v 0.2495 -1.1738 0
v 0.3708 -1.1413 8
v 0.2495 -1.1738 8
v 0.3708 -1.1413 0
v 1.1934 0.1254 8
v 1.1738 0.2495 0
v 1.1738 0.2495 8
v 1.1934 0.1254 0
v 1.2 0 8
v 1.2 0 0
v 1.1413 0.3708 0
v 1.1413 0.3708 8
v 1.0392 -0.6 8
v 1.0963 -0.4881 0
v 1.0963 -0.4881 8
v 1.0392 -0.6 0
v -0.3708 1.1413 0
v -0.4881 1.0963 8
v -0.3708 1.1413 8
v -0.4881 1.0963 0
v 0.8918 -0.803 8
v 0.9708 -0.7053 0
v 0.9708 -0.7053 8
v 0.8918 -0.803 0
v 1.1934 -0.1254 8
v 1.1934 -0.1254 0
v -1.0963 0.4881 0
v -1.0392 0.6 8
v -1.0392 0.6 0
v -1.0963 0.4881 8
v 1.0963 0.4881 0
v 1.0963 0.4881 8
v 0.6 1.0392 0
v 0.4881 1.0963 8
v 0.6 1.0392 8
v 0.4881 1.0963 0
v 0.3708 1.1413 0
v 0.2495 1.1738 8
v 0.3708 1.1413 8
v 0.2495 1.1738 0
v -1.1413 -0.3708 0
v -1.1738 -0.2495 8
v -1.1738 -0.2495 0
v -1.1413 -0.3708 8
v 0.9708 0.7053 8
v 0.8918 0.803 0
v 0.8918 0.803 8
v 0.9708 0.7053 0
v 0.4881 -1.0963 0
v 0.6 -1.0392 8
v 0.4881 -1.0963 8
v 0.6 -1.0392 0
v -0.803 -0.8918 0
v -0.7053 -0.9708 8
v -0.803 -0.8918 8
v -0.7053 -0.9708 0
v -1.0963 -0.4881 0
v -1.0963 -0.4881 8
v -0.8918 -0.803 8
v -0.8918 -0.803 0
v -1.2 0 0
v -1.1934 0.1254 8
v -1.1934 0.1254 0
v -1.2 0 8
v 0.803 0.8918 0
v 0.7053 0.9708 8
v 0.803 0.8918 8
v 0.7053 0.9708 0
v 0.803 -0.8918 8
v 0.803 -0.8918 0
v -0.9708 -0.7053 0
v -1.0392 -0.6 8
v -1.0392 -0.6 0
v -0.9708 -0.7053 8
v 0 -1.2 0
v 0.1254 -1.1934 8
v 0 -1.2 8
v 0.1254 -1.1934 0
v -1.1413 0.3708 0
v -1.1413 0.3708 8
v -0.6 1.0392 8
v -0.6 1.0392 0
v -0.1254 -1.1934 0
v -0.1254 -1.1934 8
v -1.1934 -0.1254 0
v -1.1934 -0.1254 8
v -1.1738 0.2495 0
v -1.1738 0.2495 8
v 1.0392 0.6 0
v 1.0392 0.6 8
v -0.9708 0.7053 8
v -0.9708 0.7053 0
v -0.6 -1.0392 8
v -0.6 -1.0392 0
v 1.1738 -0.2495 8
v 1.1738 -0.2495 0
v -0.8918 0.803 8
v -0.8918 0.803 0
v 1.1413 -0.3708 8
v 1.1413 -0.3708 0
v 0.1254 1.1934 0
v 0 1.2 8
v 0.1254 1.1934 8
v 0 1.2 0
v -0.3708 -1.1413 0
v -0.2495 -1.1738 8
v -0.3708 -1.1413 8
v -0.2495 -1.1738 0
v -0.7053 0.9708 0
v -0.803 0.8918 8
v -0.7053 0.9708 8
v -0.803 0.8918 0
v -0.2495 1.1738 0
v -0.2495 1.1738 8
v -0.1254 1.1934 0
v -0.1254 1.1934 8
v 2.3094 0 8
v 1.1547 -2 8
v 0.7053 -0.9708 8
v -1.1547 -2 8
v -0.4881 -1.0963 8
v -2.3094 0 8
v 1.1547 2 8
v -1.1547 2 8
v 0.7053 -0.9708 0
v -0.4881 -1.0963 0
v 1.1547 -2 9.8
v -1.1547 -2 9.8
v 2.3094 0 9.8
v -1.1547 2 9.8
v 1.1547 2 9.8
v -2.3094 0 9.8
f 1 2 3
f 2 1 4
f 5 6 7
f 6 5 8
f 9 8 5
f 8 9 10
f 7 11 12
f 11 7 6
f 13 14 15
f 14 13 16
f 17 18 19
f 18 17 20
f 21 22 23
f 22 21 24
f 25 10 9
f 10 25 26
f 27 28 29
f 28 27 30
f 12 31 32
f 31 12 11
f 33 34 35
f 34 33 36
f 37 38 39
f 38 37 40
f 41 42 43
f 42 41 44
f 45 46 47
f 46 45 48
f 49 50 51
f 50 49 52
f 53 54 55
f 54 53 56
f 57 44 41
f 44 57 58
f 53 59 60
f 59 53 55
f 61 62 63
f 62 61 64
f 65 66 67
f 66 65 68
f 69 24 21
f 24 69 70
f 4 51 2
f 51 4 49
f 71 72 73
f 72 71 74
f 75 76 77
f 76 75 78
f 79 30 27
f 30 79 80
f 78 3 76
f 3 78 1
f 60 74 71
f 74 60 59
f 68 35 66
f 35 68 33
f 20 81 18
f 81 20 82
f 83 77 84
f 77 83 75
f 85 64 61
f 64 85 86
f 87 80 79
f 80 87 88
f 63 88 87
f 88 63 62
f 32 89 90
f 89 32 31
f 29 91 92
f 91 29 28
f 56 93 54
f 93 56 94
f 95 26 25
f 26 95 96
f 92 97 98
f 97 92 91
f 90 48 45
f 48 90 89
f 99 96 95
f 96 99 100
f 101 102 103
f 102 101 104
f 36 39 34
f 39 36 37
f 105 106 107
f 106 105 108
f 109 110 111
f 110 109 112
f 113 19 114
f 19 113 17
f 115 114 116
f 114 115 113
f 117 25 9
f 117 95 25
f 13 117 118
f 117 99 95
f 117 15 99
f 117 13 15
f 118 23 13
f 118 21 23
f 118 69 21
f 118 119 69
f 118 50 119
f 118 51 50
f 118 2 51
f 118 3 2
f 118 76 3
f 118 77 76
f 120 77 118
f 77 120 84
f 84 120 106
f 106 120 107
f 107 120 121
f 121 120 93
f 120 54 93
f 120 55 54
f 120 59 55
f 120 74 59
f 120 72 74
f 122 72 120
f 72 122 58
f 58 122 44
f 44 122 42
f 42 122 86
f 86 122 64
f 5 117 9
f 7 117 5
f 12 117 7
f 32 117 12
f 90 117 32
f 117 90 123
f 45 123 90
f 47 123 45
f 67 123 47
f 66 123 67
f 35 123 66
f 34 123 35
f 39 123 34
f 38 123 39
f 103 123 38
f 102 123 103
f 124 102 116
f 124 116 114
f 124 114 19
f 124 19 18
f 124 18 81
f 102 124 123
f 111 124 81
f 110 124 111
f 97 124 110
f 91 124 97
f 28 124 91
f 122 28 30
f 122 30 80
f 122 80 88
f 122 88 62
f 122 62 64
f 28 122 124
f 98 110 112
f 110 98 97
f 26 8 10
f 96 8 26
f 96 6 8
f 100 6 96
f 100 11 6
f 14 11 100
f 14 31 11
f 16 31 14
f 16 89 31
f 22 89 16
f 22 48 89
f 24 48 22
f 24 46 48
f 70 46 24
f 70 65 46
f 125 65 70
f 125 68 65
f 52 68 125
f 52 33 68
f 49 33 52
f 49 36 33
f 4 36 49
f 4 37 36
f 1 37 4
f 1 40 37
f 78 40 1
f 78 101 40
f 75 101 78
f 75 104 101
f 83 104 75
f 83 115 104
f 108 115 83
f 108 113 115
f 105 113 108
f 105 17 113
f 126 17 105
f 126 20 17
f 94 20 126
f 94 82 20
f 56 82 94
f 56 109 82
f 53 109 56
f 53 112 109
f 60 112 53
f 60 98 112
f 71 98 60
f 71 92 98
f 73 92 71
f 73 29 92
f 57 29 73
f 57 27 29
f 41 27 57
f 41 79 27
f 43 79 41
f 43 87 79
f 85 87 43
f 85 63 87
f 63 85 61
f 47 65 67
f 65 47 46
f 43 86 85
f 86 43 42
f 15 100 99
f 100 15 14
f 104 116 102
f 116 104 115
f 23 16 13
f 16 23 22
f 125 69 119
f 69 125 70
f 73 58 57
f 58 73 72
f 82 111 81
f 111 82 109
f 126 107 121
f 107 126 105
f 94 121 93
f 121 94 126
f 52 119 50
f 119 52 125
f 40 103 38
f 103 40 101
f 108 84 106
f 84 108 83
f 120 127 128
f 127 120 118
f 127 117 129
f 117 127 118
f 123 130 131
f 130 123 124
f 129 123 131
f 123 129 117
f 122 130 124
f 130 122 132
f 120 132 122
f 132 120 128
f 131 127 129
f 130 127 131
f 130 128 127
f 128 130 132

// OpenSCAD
// Hex-head bolt.
$fn = 60;
eps = 0.02;
thread_d = 2.4;
flat = 4;
shaft_l = 8;
union() { cylinder(d=thread_d,h=shaft_l); translate([0,0,shaft_l]) cylinder(d=flat/cos(30),h=flat*0.45,$fn=6); }
